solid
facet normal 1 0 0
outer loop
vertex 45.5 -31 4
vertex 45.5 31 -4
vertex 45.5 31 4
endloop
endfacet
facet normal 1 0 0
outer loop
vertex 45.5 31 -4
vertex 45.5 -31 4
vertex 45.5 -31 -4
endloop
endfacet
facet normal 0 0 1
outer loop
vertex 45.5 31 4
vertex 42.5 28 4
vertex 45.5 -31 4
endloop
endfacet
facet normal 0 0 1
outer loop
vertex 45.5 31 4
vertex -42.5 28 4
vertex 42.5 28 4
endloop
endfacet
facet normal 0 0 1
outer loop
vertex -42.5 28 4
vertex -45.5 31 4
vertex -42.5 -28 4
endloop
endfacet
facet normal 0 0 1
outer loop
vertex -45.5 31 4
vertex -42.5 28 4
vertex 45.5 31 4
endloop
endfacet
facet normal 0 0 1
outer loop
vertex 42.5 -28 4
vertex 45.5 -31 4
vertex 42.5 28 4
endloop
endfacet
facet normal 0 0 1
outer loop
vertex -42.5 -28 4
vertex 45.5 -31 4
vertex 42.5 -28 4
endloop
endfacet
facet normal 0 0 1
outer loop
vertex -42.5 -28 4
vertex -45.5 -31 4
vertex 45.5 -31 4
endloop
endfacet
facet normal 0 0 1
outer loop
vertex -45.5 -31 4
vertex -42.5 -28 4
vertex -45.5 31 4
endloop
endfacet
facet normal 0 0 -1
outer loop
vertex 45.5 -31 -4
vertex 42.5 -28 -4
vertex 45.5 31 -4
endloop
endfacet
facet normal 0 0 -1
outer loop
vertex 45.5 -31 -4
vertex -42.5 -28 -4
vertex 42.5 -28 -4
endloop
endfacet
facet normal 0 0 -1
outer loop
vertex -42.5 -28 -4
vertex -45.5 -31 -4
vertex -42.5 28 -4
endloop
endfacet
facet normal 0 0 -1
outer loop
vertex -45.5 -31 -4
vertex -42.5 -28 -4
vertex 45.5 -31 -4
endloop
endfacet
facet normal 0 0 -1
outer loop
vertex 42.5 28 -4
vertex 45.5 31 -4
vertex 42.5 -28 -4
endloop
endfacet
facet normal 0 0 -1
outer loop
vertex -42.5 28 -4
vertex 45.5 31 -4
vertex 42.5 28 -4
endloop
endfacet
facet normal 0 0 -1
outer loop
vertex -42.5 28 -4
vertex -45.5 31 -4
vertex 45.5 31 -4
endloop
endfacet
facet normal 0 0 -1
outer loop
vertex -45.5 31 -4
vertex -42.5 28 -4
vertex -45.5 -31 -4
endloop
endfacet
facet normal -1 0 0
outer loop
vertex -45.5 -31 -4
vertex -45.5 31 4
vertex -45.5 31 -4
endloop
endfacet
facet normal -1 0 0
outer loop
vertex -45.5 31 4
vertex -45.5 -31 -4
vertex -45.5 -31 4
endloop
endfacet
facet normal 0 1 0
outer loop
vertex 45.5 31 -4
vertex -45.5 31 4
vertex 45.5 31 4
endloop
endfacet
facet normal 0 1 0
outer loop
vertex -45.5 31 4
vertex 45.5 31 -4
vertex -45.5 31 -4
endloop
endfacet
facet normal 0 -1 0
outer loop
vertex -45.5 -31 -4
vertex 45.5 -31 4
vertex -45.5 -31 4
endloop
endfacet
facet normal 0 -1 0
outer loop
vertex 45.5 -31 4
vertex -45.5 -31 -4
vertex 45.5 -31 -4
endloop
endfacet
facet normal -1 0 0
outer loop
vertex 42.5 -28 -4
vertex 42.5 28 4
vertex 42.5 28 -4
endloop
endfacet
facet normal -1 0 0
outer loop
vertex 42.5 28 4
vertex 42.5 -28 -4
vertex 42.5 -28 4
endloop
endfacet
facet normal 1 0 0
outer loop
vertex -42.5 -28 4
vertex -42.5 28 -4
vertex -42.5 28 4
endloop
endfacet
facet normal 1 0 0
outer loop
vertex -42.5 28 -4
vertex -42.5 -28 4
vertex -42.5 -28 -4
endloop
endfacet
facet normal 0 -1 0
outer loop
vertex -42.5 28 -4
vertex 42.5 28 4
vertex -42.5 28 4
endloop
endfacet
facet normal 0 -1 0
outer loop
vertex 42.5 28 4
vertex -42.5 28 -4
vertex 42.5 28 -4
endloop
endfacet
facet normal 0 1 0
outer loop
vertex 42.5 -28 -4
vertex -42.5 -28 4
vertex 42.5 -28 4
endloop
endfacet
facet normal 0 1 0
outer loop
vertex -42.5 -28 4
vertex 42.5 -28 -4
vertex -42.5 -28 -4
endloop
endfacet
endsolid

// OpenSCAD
// Nemean VR Helmet Internal Mounts (OpenSCAD CAD Source)
// Custom mounting frame for Raspberry Pi 5 & HUD Lens Bracket

$fn = 50;

// Base Pi 5 Mount Dimensions
pi_length = 85;
pi_width = 56;

module pi5_mount_plate() {
    difference() {
        cube([pi_length + 6, pi_width + 6, 8], center = true);
        cube([pi_length, pi_width, 10], center = true);
    }
}

// Internal lens bracket structure
pi5_mount_plate();
